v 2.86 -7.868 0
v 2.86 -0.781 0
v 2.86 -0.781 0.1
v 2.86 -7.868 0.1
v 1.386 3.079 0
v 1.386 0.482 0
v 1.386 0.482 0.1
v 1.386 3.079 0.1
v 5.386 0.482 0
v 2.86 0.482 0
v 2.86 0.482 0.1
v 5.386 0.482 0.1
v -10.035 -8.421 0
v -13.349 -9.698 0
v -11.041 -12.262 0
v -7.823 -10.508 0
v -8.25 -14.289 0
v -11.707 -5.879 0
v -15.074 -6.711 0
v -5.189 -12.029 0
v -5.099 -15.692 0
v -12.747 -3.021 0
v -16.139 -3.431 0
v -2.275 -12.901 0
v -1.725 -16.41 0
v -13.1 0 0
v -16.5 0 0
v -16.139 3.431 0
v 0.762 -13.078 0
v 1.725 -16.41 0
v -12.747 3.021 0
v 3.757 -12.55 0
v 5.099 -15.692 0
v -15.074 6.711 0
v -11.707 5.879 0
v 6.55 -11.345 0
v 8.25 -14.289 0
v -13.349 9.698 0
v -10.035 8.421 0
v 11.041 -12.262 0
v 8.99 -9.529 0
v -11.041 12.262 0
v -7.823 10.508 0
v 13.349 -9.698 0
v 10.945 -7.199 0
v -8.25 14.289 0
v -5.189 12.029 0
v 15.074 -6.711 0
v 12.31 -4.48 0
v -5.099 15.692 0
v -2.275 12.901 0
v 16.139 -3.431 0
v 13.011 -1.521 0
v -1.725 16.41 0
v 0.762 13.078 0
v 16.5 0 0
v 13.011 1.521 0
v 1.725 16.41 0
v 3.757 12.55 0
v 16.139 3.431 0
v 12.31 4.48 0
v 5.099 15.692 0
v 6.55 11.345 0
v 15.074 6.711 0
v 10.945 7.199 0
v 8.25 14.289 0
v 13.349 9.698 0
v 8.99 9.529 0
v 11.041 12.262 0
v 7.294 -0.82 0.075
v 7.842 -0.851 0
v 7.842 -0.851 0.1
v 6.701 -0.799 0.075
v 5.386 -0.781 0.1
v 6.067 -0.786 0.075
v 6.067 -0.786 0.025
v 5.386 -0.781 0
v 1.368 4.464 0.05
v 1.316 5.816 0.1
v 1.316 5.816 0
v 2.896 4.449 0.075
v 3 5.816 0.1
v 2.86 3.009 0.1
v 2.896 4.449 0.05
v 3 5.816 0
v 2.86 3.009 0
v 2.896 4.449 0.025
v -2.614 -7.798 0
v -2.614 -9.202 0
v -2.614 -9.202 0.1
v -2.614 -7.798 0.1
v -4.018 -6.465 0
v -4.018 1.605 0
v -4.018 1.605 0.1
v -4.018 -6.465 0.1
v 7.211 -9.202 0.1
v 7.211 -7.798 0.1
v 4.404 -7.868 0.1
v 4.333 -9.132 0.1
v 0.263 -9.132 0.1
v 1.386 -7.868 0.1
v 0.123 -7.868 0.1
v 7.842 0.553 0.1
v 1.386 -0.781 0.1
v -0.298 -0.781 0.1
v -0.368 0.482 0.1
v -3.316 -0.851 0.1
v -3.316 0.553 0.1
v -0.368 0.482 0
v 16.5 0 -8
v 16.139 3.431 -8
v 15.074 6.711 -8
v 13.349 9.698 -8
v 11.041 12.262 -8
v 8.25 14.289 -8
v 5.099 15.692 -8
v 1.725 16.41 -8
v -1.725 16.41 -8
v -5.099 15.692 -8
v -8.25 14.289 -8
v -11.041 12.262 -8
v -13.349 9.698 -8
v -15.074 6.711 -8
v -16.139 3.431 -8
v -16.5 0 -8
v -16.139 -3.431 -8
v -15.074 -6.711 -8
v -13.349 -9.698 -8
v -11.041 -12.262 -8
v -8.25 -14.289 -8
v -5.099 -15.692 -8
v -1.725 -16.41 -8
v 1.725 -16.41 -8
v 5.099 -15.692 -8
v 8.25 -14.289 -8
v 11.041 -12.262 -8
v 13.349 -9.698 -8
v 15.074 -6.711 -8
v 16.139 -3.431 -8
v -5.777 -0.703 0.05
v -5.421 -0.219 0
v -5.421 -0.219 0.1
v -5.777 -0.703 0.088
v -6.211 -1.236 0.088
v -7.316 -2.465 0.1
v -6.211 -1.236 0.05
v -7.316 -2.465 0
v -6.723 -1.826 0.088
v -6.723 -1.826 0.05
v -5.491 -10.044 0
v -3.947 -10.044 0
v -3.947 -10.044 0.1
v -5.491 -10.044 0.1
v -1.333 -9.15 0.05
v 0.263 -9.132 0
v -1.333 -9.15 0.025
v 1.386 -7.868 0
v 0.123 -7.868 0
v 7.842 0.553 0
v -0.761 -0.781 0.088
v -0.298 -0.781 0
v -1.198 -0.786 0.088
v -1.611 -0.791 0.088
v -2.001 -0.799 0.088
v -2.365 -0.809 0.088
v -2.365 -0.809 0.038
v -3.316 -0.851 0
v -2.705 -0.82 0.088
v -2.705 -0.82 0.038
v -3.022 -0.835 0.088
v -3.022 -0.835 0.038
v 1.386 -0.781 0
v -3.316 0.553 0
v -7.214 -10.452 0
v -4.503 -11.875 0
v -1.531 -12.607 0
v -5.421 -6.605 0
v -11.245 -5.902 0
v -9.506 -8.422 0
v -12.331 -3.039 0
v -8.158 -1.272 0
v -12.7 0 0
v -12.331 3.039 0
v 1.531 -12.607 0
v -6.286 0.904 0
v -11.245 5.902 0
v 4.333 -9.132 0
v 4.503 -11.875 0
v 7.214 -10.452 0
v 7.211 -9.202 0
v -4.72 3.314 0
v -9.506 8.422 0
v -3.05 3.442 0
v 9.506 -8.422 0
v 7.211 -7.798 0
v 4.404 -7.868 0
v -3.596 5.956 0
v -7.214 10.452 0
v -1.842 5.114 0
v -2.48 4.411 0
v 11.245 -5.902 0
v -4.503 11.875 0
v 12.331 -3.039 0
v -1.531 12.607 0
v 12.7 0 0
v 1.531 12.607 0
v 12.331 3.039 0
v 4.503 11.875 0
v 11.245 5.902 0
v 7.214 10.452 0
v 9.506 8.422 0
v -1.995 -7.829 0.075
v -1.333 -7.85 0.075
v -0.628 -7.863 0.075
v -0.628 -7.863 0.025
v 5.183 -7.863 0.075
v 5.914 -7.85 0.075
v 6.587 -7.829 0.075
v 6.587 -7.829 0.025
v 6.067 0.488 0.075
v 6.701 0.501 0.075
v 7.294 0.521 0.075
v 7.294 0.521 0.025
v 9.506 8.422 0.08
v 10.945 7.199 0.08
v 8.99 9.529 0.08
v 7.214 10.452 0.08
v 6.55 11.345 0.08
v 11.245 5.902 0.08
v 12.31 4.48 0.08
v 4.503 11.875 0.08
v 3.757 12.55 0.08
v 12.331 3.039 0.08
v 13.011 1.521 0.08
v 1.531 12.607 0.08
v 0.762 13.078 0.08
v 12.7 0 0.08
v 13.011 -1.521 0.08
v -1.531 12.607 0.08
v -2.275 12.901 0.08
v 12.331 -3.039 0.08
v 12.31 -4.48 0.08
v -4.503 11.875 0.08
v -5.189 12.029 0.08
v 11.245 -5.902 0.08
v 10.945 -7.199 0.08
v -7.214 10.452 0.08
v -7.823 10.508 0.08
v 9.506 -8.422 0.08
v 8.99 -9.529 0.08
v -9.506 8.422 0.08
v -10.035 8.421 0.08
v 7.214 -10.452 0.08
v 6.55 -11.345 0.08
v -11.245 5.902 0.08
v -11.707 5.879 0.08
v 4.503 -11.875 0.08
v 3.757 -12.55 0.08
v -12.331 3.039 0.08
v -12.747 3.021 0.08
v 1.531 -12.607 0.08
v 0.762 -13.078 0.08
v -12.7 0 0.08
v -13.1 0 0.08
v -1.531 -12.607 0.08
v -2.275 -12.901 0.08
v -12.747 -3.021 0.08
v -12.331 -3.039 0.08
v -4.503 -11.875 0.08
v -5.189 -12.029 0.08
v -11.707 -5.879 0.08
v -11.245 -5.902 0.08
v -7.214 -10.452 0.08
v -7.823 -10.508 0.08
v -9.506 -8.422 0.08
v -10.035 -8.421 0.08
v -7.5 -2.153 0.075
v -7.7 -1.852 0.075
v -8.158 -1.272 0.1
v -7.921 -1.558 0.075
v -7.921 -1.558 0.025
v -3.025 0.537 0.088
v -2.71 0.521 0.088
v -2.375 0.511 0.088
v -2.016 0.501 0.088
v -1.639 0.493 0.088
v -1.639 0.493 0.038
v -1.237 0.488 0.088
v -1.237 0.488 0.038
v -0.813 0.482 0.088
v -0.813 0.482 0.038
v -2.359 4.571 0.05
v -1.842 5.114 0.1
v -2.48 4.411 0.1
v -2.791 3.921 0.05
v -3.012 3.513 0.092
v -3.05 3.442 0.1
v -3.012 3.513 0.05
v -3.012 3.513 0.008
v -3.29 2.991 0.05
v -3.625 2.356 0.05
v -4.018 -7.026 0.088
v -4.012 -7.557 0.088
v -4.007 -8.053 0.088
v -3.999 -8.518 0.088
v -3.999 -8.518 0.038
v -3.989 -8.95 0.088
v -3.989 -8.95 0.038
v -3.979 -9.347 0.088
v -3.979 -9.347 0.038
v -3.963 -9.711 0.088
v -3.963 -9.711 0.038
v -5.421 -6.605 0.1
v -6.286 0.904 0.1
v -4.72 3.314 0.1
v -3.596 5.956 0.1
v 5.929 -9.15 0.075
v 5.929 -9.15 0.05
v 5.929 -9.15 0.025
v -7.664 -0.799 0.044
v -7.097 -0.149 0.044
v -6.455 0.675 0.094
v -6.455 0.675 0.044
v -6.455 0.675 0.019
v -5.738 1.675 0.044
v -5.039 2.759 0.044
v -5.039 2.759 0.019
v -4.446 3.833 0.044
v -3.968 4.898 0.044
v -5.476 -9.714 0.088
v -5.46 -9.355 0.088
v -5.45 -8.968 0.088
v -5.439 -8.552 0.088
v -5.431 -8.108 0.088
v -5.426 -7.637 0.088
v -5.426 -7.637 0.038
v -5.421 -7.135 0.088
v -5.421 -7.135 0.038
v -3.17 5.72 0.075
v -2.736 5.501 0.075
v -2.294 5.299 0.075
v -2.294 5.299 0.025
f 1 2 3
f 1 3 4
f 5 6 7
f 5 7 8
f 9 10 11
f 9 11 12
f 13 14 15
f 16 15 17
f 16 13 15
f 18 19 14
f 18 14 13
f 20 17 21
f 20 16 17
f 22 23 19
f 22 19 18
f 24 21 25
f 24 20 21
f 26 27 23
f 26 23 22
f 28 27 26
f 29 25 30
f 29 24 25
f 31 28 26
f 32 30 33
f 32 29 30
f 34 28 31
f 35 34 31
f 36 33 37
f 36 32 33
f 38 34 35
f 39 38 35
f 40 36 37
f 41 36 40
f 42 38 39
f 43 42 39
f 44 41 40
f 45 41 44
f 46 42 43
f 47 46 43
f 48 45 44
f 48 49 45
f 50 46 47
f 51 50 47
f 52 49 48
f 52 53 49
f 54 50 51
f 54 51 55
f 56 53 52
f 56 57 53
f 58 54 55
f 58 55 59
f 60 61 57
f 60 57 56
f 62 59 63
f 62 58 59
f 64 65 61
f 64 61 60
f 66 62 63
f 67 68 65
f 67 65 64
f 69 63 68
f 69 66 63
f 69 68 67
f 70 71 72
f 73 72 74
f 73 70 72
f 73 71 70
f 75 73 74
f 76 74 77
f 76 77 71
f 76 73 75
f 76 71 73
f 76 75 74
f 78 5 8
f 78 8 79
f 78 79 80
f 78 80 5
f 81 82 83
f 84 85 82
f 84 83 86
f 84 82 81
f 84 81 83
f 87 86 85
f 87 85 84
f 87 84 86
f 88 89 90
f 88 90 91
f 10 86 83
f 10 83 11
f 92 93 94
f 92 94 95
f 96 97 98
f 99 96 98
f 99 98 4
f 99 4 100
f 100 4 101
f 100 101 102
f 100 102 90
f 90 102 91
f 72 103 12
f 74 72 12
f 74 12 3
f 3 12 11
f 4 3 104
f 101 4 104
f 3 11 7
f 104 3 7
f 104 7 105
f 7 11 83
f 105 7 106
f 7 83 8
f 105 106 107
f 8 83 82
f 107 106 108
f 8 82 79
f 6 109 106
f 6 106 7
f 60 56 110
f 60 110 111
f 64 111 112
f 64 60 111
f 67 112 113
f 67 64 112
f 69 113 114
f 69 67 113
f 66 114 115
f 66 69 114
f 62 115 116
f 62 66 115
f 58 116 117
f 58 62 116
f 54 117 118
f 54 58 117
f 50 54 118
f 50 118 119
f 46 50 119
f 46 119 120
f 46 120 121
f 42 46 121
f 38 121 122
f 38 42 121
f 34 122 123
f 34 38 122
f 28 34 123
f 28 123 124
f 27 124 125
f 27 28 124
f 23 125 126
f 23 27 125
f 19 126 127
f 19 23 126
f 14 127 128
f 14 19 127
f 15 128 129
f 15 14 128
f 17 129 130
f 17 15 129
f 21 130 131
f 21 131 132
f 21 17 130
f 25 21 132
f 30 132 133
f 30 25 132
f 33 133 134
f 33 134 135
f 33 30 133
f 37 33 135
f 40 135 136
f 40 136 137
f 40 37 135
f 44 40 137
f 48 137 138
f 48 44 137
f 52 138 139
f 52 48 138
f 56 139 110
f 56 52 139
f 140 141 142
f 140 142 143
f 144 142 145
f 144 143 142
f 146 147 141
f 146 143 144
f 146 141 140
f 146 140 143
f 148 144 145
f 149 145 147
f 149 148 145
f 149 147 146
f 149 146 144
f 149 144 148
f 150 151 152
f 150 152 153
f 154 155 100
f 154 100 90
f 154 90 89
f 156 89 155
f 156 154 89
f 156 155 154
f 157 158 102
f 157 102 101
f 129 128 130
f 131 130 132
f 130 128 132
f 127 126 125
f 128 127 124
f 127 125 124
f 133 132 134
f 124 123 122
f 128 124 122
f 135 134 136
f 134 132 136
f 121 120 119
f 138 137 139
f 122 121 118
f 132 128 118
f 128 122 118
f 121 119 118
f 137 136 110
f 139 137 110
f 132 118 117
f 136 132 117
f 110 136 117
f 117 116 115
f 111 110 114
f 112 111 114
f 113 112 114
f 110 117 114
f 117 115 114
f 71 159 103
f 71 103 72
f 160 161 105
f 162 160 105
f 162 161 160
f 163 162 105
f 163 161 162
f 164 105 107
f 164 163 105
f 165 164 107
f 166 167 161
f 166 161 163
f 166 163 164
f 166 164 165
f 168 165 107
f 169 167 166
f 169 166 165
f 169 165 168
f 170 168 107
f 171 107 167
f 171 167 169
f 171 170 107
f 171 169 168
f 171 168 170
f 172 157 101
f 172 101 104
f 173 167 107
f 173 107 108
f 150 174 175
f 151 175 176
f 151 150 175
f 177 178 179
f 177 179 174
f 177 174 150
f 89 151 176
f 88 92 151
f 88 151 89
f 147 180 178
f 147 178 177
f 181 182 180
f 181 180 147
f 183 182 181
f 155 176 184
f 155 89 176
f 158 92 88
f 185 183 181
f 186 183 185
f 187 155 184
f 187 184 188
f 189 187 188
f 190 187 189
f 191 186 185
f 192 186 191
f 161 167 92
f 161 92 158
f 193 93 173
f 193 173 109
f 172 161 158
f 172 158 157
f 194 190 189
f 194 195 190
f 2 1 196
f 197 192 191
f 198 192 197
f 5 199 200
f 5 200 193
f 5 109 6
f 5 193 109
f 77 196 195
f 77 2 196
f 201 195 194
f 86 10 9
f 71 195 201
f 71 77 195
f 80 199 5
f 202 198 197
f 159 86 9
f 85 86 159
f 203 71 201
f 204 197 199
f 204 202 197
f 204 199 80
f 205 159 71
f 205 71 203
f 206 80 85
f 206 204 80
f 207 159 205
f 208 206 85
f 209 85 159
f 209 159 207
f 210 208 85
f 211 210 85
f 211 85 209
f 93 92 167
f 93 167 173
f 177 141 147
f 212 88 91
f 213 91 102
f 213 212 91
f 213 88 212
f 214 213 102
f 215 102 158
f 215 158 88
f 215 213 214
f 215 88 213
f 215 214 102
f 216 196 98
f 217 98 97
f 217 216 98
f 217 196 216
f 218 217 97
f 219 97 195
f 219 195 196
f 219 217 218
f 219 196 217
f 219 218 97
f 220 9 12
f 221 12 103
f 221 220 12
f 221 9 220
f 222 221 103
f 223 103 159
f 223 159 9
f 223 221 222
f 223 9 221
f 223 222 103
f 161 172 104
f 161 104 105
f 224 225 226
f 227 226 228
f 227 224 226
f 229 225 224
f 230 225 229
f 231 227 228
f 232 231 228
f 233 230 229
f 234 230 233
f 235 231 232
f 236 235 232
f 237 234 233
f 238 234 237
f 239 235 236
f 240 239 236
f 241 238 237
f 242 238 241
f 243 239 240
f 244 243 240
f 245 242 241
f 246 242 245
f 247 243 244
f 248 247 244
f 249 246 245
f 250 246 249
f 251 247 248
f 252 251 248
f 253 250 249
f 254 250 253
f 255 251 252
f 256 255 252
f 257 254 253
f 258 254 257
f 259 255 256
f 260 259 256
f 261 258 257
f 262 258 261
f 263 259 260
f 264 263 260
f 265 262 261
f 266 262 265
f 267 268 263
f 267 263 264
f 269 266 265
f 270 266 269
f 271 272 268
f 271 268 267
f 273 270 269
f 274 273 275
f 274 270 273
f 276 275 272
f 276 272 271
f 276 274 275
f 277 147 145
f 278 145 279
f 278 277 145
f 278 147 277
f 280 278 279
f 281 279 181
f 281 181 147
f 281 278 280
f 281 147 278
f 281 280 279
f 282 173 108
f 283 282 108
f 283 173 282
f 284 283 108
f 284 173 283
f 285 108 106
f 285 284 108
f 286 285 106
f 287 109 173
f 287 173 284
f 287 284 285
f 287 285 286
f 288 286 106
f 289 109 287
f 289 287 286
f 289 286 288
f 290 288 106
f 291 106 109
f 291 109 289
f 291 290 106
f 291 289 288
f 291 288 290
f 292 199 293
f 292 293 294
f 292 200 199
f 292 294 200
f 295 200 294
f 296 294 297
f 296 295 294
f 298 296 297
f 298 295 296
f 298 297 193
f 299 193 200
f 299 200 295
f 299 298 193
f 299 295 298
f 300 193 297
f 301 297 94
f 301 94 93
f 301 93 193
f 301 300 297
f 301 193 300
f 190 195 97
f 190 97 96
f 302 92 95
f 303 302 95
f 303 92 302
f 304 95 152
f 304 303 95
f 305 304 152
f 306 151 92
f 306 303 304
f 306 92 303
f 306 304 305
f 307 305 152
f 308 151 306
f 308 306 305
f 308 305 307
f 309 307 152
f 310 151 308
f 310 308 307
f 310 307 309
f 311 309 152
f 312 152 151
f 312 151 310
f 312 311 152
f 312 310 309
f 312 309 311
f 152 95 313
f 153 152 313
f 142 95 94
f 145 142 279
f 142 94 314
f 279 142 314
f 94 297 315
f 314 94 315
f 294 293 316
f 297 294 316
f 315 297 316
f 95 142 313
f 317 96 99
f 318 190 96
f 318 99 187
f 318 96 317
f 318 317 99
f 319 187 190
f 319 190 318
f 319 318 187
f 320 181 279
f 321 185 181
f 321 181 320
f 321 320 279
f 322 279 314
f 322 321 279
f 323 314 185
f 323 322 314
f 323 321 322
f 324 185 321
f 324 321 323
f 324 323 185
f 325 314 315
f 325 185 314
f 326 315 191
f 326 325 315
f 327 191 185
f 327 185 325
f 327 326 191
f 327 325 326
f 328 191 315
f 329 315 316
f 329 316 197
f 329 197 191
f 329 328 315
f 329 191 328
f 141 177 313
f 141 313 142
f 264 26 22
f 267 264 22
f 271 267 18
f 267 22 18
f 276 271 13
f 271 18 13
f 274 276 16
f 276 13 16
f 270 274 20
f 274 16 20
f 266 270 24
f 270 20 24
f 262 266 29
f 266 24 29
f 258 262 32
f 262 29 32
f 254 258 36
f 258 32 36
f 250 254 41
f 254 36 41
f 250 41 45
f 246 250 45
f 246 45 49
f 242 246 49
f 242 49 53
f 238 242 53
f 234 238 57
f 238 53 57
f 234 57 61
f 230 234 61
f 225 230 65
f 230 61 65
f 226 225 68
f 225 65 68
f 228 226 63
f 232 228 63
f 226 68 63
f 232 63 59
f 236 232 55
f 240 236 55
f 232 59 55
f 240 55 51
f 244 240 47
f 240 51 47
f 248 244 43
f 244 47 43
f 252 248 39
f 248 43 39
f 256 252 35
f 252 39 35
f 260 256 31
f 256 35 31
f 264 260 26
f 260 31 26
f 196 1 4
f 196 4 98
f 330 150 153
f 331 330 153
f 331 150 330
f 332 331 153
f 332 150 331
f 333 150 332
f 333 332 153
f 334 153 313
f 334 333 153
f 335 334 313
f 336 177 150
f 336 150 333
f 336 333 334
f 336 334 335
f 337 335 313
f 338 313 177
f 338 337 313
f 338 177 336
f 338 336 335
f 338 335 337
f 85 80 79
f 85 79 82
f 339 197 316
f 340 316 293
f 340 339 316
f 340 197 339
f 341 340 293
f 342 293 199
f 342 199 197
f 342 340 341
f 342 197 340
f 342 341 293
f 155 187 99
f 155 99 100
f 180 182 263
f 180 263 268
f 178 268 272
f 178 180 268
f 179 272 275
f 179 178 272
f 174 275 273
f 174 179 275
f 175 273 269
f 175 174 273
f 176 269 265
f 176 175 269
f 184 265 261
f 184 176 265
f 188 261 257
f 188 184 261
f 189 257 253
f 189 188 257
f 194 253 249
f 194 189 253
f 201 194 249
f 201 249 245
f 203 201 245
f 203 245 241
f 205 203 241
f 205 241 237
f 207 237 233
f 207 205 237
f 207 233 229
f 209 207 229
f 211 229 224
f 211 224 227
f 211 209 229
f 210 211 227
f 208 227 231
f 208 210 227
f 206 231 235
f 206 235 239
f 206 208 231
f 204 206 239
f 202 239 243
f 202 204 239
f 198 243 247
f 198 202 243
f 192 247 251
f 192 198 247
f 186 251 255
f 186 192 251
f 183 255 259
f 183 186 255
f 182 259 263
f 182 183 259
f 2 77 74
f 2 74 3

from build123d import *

# Parameters (mm, degrees)
SKETCH_1_R               = 16.5
DIAMETER33_HEIGHT8_DEPTH = 8
CHARACTER_DEPTH          = 0.1
SKETCH_3_R               = 13.1
SKETCH_3_R_2             = 12.7
INK_RING_DEPTH           = 0.08


with BuildPart() as part:
    # 草图1 → Diameter33_Height8 (new body)
    with BuildSketch(Plane.XY):
        Circle(SKETCH_1_R)
    extrude(amount=-DIAMETER33_HEIGHT8_DEPTH)

    # 草图2 → Character_仕 (add)
    with BuildSketch(Plane.XY):
        with BuildLine():
            Line((1.385964912, 0.48245614), (1.385964912, 3.078947368))
            add(Edge.make_bspline(
                [(1.385964912, 3.078947368), (1.382856556, 3.540795331), (1.376713677, 4.453520939), (1.335934161, 5.365353156), (1.315789474, 5.815789474)],
                knots=[0, 0, 0, 0, 1.012019295, 2, 2, 2, 2], degree=3))
            Line((1.315789474, 5.815789474), (3, 5.815789474))
            add(Edge.make_bspline(
                [(3, 5.815789474), (2.977495606, 5.590667791), (2.932023515, 5.135789802), (2.894778649, 4.442009997), (2.862268379, 3.73162247), (2.860528273, 3.251395934), (2.859649123, 3.00877193)],
                knots=[0, 0, 0, 0, 0.965427312, 1.950730062, 2.964650972, 4, 4, 4, 4], degree=3))
            Line((2.859649123, 3.00877193), (2.859649123, 0.48245614))
            Line((2.859649123, 0.48245614), (5.385964912, 0.48245614))
            add(Edge.make_bspline(
                [(5.385964912, 0.48245614), (5.612960978, 0.48353494), (6.051396179, 0.485618604), (6.68734214, 0.499259504), (7.279297852, 0.517890937), (7.659345282, 0.541350279), (7.842105263, 0.552631579)],
                knots=[0, 0, 0, 0, 1.108393509, 2.14082447, 3.105946107, 4, 4, 4, 4], degree=3))
            Line((7.842105263, 0.552631579), (7.842105263, -0.850877193))
            add(Edge.make_bspline(
                [(7.842105263, -0.850877193), (7.659345282, -0.839595893), (7.279297852, -0.816136551), (6.68734214, -0.797505118), (6.051396179, -0.783864218), (5.612960978, -0.781780554), (5.385964912, -0.780701754)],
                knots=[0, 0, 0, 0, 0.894053893, 1.85917553, 2.891606491, 4, 4, 4, 4], degree=3))
            Line((5.385964912, -0.780701754), (2.859649123, -0.780701754))
            Line((2.859649123, -0.780701754), (2.859649123, -7.868421053))
            Line((2.859649123, -7.868421053), (4.403508772, -7.868421053))
            add(Edge.make_bspline(
                [(4.403508772, -7.868421053), (4.663425226, -7.867326084), (5.166829886, -7.865205357), (5.894610336, -7.851761208), (6.570572064, -7.832958173), (7.00263653, -7.809522024), (7.210526316, -7.798245614)],
                knots=[0, 0, 0, 0, 1.110647855, 2.151096232, 3.11039153, 4, 4, 4, 4], degree=3))
            Line((7.210526316, -7.798245614), (7.210526316, -9.201754386))
            add(Edge.make_bspline(
                [(7.210526316, -9.201754386), (7.010437031, -9.190419998), (6.583606619, -9.166241483), (5.90326924, -9.148137401), (5.144305253, -9.134624919), (4.612310457, -9.132626772), (4.333333333, -9.131578947)],
                knots=[0, 0, 0, 0, 0.835449614, 1.782180905, 2.836979614, 4, 4, 4, 4], degree=3))
            Line((4.333333333, -9.131578947), (0.263157895, -9.131578947))
            add(Edge.make_bspline(
                [(0.263157895, -9.131578947), (-0.015819229, -9.132626772), (-0.547814025, -9.134624919), (-1.306778012, -9.148137401), (-1.987115391, -9.166241483), (-2.413945803, -9.190419998), (-2.614035088, -9.201754386)],
                knots=[0, 0, 0, 0, 1.163020386, 2.217819095, 3.164550386, 4, 4, 4, 4], degree=3))
            Line((-2.614035088, -9.201754386), (-2.614035088, -7.798245614))
            add(Edge.make_bspline(
                [(-2.614035088, -7.798245614), (-2.407878143, -7.809517208), (-1.981010451, -7.832856124), (-1.318910587, -7.851574268), (-0.61279286, -7.865227274), (-0.127579839, -7.86733394), (0.122807018, -7.868421053)],
                knots=[0, 0, 0, 0, 0.904818853, 1.873514066, 2.902659025, 4, 4, 4, 4], degree=3))
            Line((0.122807018, -7.868421053), (1.385964912, -7.868421053))
            Line((1.385964912, -7.868421053), (1.385964912, -0.780701754))
            Line((1.385964912, -0.780701754), (-0.298245614, -0.780701754))
            add(Edge.make_bspline(
                [(-0.298245614, -0.780701754), (-0.452461393, -0.780188061), (-0.752239456, -0.7791895), (-1.189731892, -0.786231443), (-1.603011279, -0.790357704), (-1.992035716, -0.797879868), (-2.356713286, -0.809539056), (-2.697351984, -0.817728412), (-3.014316789, -0.834938878), (-3.217890625, -0.845701458), (-3.315789474, -0.850877193)],
                knots=[0, 0, 0, 0, 1.226022714, 2.383249742, 3.478491498, 4.511863319, 5.476544353, 6.379262498, 7.220585815, 8, 8, 8, 8], degree=3))
            Line((-3.315789474, -0.850877193), (-3.315789474, 0.552631579))
            add(Edge.make_bspline(
                [(-3.315789474, 0.552631579), (-3.21875707, 0.547453703), (-3.016916501, 0.536683017), (-2.703415706, 0.519544836), (-2.367110401, 0.511265445), (-2.010227251, 0.49975938), (-1.630736813, 0.492055864), (-1.229584063, 0.488016267), (-0.805954579, 0.480955843), (-0.51657237, 0.481948131), (-0.368421053, 0.48245614)],
                knots=[0, 0, 0, 0, 0.790917863, 1.645216496, 2.555317213, 3.528854326, 4.55156314, 5.644660669, 6.794166974, 8, 8, 8, 8], degree=3))
            Line((-0.368421053, 0.48245614), (1.385964912, 0.48245614))
        make_face()
        with BuildLine():
            add(Edge.make_bspline(
                [(-1.842105263, 5.114035088), (-1.933851435, 5.029026304), (-2.117541902, 4.858825164), (-2.365563333, 4.57167672), (-2.591993254, 4.259206087), (-2.763277727, 3.974023896), (-2.899956693, 3.72227062), (-3.016573333, 3.503293196), (-3.149738899, 3.257168631), (-3.294556387, 2.980814576), (-3.455706316, 2.678049907), (-3.630506142, 2.346123327), (-3.820034881, 1.98606085), (-3.950103328, 1.735288634), (-4.01754386, 1.605263158)],
                knots=[0, 0, 0, 0, 1.083759172, 2.169858686, 3.283228111, 4.425909641, 5.051182283, 5.766997595, 6.57693099, 7.477449721, 8.472081343, 9.550673888, 10.730023607, 12, 12, 12, 12], degree=3))
            Line((-4.01754386, 1.605263158), (-4.01754386, -6.464912281))
            add(Edge.make_bspline(
                [(-4.01754386, -6.464912281), (-4.018056133, -6.65204931), (-4.019052245, -7.015935362), (-4.012047973, -7.545266441), (-4.007901436, -8.042578811), (-4.000400634, -8.506973521), (-3.988771218, -8.938370958), (-3.98063319, -9.336170915), (-3.963429216, -9.700804491), (-3.952560119, -9.932966081), (-3.947368421, -10.043859649)],
                knots=[0, 0, 0, 0, 1.25452393, 2.439409025, 3.548794241, 4.588568869, 5.552973603, 6.441898353, 7.255762113, 8, 8, 8, 8], degree=3))
            Line((-3.947368421, -10.043859649), (-5.49122807, -10.043859649))
            add(Edge.make_bspline(
                [(-5.49122807, -10.043859649), (-5.48604403, -9.933832078), (-5.4752279, -9.704267368), (-5.458045854, -9.34570061), (-5.449866698, -8.958296312), (-5.43824574, -8.54249494), (-5.430714946, -8.098893278), (-5.426551478, -7.626704474), (-5.419547466, -7.12596442), (-5.420541736, -6.782003967), (-5.421052632, -6.605263158)],
                knots=[0, 0, 0, 0, 0.768562205, 1.603550436, 2.504569286, 3.472060047, 4.505901887, 5.600100741, 6.766834584, 8, 8, 8, 8], degree=3))
            Line((-5.421052632, -6.605263158), (-5.421052632, -0.219298246))
            add(Edge.make_bspline(
                [(-5.421052632, -0.219298246), (-5.477100123, -0.297465115), (-5.593729665, -0.460122996), (-5.780061764, -0.708596832), (-5.986068105, -0.970387502), (-6.216160665, -1.241667605), (-6.462173545, -1.53007964), (-6.726721569, -1.832063458), (-7.014400911, -2.14414193), (-7.213381091, -2.355918188), (-7.315789474, -2.464912281)],
                knots=[0, 0, 0, 0, 0.784966074, 1.633440328, 2.534521274, 3.503196048, 4.536232569, 5.628408604, 6.779421952, 8, 8, 8, 8], degree=3))
            add(Edge.make_bspline(
                [(-7.315789474, -2.464912281), (-7.376217454, -2.360289355), (-7.496986321, -2.151194296), (-7.698613752, -1.847907954), (-7.919509238, -1.554794995), (-8.078179419, -1.366518997), (-8.157894737, -1.271929825)],
                knots=[0, 0, 0, 0, 0.990939877, 1.980451519, 2.985386235, 4, 4, 4, 4], degree=3))
            add(Edge.make_bspline(
                [(-8.157894737, -1.271929825), (-8.078444276, -1.200683827), (-7.908680075, -1.048450351), (-7.650883543, -0.790792829), (-7.380450508, -0.484210357), (-7.085685528, -0.139123391), (-6.774453616, 0.251552056), (-6.444928694, 0.686800589), (-6.093822829, 1.163741111), (-5.733795482, 1.678782143), (-5.373823069, 2.211324676), (-5.038729415, 2.753088359), (-4.729340369, 3.291388528), (-4.443634689, 3.826106433), (-4.193529603, 4.362171988), (-3.965829486, 4.893831939), (-3.764036827, 5.42296806), (-3.651942432, 5.779680656), (-3.596491228, 5.956140351)],
                knots=[0, 0, 0, 0, 0.593635041, 1.268437926, 2.026139621, 2.86729733, 3.793145817, 4.804357063, 5.904290477, 7.087660503, 8.300109294, 9.479773153, 10.630579527, 11.753876596, 12.851315059, 13.920229824, 14.971172829, 16, 16, 16, 16], degree=3))
            add(Edge.make_bspline(
                [(-3.596491228, 5.956140351), (-3.455102142, 5.876001082), (-3.172790986, 5.715987251), (-2.737023645, 5.499372043), (-2.295481279, 5.293961951), (-1.99346903, 5.174105332), (-1.842105263, 5.114035088)],
                knots=[0, 0, 0, 0, 1.001016569, 1.998726716, 2.996993449, 4, 4, 4, 4], degree=3))
        make_face()
    extrude(amount=CHARACTER_DEPTH)

    # 草图3 → Ink_ring (add)
    with BuildSketch(Plane.XY):
        with Locations(Location((0, 0, 0), (0, 0, 180))):
            Circle(SKETCH_3_R)
        with Locations(Location((0, 0, 0), (0, 0, 180))):
            Circle(SKETCH_3_R_2, mode=Mode.SUBTRACT)
    extrude(amount=INK_RING_DEPTH)


solid = part.part
